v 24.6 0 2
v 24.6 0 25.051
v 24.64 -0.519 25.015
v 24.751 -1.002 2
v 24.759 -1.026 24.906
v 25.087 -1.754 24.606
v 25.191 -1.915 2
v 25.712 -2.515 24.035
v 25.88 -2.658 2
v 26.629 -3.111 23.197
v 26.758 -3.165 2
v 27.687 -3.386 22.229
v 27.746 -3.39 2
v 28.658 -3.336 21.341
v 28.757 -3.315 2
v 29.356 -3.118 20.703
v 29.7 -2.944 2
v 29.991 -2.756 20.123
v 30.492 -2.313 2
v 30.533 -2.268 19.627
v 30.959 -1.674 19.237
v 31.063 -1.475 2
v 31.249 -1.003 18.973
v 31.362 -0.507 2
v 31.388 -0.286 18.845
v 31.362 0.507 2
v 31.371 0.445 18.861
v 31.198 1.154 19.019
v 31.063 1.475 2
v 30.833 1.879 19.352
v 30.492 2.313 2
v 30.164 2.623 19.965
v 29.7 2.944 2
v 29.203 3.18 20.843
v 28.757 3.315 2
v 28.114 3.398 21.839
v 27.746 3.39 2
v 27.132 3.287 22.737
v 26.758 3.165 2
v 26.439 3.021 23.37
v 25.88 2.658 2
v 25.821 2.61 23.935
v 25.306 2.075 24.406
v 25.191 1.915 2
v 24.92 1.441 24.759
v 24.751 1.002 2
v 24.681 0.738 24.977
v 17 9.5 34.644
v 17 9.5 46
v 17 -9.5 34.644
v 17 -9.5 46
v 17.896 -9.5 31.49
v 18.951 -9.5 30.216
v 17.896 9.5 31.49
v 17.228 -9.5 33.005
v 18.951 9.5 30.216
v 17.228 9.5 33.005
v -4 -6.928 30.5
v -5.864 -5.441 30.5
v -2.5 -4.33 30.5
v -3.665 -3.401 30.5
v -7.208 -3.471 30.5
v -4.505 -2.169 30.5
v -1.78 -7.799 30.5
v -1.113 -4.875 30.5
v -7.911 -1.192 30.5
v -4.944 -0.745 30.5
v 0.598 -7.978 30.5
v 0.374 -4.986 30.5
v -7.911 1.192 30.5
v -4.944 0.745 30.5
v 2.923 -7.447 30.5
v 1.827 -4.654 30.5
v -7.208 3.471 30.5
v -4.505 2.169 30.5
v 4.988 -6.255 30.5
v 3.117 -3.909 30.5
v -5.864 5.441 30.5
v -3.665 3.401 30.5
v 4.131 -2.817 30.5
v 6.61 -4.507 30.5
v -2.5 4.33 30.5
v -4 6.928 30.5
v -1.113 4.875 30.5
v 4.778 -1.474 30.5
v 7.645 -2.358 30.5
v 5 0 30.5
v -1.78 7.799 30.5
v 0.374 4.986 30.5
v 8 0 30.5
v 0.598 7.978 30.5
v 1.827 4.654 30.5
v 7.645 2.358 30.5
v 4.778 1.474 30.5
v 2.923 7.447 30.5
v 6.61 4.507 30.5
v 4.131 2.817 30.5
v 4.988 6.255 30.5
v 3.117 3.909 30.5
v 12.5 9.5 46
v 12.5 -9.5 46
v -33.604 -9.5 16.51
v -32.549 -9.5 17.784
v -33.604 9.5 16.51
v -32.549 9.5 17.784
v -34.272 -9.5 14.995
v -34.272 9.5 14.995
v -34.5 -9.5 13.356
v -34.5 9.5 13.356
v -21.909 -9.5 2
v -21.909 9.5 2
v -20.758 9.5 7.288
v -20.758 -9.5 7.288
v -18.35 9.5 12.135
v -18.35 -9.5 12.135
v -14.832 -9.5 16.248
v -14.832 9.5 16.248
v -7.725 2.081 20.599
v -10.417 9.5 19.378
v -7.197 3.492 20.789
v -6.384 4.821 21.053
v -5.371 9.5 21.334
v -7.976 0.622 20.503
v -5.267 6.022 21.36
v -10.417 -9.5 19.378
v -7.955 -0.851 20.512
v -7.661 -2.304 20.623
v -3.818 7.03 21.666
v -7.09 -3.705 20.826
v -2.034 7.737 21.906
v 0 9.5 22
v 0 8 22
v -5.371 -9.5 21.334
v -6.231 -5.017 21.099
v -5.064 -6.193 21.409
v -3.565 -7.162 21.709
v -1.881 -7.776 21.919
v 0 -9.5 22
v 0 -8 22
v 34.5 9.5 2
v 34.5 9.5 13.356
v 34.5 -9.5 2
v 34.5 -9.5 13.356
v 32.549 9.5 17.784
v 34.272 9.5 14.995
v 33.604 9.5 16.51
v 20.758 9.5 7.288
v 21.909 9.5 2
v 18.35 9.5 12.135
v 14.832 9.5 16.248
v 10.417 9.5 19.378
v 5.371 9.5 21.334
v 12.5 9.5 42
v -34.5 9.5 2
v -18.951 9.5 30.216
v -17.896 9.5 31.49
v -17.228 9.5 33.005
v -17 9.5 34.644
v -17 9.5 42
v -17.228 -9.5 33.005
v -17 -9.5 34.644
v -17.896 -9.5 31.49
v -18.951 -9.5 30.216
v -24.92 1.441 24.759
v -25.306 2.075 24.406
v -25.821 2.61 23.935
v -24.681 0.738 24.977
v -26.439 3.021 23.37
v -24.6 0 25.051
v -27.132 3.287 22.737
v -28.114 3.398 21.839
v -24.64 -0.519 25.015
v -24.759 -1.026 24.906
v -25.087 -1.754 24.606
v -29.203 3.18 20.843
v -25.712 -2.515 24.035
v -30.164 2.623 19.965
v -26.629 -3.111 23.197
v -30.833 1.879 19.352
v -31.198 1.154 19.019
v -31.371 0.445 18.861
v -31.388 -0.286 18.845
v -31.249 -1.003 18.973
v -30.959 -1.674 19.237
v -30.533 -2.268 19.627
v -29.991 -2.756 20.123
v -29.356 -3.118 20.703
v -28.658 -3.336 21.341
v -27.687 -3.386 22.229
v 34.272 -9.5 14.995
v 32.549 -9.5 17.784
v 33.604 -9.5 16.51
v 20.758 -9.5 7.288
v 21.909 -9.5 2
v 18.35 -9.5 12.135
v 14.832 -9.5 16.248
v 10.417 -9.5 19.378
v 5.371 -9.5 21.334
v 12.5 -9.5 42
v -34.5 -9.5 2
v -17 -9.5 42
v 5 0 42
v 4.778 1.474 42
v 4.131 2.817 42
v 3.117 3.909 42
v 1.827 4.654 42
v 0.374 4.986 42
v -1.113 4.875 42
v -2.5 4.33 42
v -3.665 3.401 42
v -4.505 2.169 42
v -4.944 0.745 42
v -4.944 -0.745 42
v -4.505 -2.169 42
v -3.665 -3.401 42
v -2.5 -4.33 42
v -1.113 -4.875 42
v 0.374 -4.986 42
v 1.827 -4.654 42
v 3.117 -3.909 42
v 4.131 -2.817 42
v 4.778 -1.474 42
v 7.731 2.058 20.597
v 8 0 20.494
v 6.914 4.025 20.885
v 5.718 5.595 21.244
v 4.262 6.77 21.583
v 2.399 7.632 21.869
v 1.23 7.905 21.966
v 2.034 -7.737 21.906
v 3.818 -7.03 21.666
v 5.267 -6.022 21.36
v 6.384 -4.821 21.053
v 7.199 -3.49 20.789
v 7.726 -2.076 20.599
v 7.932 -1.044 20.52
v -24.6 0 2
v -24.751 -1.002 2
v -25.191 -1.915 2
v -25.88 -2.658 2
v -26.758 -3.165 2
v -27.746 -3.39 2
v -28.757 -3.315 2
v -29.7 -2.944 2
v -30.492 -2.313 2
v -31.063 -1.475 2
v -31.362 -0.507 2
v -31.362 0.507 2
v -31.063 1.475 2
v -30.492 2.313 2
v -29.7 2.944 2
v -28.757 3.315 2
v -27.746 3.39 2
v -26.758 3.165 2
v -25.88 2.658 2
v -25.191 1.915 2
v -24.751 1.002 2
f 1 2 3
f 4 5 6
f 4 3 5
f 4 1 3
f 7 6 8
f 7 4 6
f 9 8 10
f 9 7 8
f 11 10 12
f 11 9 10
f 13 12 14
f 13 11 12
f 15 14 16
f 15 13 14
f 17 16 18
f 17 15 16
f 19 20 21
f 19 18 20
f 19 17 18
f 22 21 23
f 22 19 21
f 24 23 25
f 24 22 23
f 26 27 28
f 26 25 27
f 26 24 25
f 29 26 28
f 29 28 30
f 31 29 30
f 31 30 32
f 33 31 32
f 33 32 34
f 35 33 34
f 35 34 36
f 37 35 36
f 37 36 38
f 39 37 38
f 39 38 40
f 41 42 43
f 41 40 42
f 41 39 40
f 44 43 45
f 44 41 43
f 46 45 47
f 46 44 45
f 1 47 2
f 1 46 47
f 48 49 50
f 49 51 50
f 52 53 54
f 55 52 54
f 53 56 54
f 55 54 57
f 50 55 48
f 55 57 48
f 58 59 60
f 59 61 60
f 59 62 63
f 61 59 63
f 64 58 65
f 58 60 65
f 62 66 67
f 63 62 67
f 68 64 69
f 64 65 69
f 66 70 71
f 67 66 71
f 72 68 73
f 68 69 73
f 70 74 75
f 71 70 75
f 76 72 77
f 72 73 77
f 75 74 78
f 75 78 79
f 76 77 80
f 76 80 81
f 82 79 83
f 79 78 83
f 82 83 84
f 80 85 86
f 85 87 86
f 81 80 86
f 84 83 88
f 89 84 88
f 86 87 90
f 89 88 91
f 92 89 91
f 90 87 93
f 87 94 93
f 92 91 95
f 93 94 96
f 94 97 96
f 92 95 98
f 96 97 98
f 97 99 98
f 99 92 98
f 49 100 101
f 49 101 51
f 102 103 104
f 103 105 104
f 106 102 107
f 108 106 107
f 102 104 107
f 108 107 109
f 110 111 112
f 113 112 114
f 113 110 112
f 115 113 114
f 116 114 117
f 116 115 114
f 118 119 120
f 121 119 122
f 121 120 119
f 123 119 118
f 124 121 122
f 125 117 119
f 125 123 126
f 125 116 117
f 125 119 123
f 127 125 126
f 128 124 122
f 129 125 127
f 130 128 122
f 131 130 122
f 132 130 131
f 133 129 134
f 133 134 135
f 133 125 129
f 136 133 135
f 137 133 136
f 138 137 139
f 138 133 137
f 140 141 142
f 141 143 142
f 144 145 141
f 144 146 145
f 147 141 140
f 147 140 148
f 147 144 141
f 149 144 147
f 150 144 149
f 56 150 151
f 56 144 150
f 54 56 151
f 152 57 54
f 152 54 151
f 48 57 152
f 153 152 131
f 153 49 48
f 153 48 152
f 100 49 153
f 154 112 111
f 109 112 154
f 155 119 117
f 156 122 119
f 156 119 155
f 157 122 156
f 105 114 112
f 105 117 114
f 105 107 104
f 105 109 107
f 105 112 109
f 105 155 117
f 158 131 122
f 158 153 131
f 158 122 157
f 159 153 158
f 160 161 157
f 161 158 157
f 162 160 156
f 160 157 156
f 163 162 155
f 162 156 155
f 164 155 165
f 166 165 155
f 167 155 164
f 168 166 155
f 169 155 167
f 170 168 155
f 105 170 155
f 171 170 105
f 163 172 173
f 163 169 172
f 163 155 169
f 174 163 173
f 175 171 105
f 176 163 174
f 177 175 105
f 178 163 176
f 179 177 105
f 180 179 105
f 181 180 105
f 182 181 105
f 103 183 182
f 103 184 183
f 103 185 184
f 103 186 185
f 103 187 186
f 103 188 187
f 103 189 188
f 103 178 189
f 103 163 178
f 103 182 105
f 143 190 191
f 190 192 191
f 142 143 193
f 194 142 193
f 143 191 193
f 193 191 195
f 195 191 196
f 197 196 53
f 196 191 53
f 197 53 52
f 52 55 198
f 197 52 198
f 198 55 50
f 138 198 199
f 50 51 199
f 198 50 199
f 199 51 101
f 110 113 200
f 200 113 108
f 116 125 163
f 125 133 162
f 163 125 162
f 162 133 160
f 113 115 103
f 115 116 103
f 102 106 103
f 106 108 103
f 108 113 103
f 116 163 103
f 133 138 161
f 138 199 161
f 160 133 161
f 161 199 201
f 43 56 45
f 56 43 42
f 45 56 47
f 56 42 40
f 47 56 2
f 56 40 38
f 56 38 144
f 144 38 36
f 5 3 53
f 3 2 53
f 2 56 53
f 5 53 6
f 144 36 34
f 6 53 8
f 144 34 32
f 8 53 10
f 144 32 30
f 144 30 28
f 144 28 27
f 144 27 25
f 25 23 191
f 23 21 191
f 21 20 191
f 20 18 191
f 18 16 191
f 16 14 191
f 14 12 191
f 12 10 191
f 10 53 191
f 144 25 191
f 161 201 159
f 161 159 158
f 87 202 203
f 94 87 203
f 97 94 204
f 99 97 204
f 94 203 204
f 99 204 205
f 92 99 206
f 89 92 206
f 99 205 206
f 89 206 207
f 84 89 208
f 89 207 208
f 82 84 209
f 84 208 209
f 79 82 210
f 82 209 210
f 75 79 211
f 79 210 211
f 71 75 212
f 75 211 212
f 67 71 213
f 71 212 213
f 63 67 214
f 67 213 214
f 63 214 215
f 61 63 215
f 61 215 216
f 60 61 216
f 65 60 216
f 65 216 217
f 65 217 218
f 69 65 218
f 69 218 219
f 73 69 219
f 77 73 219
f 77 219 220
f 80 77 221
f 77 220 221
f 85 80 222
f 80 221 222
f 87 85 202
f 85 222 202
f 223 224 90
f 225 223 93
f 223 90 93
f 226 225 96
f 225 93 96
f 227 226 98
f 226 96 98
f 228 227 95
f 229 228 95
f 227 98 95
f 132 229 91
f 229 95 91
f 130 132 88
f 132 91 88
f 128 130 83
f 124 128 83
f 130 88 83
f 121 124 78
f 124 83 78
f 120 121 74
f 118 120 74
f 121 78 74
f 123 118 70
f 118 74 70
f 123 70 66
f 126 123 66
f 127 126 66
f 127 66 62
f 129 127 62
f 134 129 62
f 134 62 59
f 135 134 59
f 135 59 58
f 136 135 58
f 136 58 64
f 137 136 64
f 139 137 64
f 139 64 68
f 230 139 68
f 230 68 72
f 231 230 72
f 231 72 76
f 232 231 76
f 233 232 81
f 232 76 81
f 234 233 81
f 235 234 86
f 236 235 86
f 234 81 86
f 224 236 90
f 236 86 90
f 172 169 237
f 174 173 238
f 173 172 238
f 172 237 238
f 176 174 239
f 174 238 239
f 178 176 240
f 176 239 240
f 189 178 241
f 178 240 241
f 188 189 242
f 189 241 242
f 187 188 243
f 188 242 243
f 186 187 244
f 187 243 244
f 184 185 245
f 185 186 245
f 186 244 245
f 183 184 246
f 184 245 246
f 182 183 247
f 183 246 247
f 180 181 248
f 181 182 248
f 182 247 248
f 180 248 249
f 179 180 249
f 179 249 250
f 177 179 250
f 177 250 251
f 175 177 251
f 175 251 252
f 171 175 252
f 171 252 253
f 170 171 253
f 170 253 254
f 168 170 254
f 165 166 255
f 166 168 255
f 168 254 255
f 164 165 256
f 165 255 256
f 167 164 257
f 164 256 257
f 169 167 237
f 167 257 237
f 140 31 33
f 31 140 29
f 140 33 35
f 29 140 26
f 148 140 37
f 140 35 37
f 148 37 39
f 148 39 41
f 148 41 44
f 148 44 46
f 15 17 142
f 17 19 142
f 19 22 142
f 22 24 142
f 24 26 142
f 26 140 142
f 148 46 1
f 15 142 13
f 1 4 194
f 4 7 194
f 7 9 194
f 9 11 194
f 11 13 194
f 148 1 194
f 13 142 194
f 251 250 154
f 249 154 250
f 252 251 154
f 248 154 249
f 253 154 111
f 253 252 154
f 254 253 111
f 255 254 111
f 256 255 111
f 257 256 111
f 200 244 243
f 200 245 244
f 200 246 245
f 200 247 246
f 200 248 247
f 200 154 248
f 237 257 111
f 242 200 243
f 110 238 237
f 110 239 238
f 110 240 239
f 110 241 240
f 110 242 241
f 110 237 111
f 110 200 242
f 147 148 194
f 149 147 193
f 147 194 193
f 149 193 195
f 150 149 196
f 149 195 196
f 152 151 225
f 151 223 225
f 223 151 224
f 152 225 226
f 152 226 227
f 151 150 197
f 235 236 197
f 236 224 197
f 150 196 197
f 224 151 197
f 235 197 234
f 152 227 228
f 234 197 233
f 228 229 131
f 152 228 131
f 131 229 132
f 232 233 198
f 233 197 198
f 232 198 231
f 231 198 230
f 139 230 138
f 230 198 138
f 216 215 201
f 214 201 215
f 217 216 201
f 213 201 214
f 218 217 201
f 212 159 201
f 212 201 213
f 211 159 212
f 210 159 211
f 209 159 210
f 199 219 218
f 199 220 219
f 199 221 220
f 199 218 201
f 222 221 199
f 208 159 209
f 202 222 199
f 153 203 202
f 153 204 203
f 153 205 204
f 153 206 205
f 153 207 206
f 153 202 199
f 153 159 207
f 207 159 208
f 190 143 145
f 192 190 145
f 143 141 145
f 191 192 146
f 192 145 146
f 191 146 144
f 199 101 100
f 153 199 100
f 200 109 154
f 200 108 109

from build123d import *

# Parameters (mm, degrees)
F1_DEPTH  = 9.5
F2_R      = 3.4
F3_DEPTH  = 23.0524285714
F5_W      = 29.5
F5_H      = 19
F6_DEPTH  = 4
F7_R      = 8
F8_DEPTH  = 40.001
F9_R      = 8
F9_R_2    = 5
F10_DEPTH = 11.5
F11_R     = 6


with BuildPart() as f1:
    # F0 (on Front) → F1 (new body, symmetric)
    with BuildSketch(Plane.XZ):
        with BuildLine():
            Line((-34.5, 2), (-21.9089023002, 2))
            ThreePointArc((-21.9089023002, 2), (-14.8323969742, 16.2480768093), (0, 22))
            Line((0, 22), (0, 46))
            Line((0, 46), (-17, 46))
            Line((-17, 46), (-17, 32))
            Line((-17, 32), (-34.5, 16))
            Line((-34.5, 16), (-34.5, 2))
        make_face()
    extrude(amount=F1_DEPTH, both=True)

    # F2 (on face) → F3 (cut, through all)
    with BuildSketch(Plane(origin=(0, 0, 2), x_dir=(1, 0, 0), z_dir=(0, 0, -1))):
        with Locations((-28, 0)):
            Circle(F2_R)
    extrude(amount=-F3_DEPTH, mode=Mode.SUBTRACT)

    # F4: F1 across plane


with BuildPart() as f1_1:
    add(f1.part)
    add(f1.part.mirror(Plane.YZ))

    # F5 (on face) → F6 (cut)
    with BuildSketch(Plane.XY.offset(46)):
        with Locations((-2.25, 0)):
            Rectangle(F5_W, F5_H)
    extrude(amount=-F6_DEPTH, mode=Mode.SUBTRACT)

    # F7 (on face) → F8 (cut, through all)
    with BuildSketch(Plane.XY.offset(42)):
        Circle(F7_R)
    extrude(amount=-F8_DEPTH, mode=Mode.SUBTRACT)

    # F9 (on face) → F10 (join)
    with BuildSketch(Plane.XY.offset(42)):
        Circle(F9_R)
        Circle(F9_R_2, mode=Mode.SUBTRACT)
    extrude(amount=-F10_DEPTH)

    # F11
    f11_edges = [f1_1.edges().sort_by_distance(p)[0] for p in [
        (-34.5, 0, 16),
        (34.5, 0, 16),
        (-17, 0, 32),
        (17, 0, 32),
    ]]
    fillet(f11_edges, radius=F11_R)


solid = f1_1.part
